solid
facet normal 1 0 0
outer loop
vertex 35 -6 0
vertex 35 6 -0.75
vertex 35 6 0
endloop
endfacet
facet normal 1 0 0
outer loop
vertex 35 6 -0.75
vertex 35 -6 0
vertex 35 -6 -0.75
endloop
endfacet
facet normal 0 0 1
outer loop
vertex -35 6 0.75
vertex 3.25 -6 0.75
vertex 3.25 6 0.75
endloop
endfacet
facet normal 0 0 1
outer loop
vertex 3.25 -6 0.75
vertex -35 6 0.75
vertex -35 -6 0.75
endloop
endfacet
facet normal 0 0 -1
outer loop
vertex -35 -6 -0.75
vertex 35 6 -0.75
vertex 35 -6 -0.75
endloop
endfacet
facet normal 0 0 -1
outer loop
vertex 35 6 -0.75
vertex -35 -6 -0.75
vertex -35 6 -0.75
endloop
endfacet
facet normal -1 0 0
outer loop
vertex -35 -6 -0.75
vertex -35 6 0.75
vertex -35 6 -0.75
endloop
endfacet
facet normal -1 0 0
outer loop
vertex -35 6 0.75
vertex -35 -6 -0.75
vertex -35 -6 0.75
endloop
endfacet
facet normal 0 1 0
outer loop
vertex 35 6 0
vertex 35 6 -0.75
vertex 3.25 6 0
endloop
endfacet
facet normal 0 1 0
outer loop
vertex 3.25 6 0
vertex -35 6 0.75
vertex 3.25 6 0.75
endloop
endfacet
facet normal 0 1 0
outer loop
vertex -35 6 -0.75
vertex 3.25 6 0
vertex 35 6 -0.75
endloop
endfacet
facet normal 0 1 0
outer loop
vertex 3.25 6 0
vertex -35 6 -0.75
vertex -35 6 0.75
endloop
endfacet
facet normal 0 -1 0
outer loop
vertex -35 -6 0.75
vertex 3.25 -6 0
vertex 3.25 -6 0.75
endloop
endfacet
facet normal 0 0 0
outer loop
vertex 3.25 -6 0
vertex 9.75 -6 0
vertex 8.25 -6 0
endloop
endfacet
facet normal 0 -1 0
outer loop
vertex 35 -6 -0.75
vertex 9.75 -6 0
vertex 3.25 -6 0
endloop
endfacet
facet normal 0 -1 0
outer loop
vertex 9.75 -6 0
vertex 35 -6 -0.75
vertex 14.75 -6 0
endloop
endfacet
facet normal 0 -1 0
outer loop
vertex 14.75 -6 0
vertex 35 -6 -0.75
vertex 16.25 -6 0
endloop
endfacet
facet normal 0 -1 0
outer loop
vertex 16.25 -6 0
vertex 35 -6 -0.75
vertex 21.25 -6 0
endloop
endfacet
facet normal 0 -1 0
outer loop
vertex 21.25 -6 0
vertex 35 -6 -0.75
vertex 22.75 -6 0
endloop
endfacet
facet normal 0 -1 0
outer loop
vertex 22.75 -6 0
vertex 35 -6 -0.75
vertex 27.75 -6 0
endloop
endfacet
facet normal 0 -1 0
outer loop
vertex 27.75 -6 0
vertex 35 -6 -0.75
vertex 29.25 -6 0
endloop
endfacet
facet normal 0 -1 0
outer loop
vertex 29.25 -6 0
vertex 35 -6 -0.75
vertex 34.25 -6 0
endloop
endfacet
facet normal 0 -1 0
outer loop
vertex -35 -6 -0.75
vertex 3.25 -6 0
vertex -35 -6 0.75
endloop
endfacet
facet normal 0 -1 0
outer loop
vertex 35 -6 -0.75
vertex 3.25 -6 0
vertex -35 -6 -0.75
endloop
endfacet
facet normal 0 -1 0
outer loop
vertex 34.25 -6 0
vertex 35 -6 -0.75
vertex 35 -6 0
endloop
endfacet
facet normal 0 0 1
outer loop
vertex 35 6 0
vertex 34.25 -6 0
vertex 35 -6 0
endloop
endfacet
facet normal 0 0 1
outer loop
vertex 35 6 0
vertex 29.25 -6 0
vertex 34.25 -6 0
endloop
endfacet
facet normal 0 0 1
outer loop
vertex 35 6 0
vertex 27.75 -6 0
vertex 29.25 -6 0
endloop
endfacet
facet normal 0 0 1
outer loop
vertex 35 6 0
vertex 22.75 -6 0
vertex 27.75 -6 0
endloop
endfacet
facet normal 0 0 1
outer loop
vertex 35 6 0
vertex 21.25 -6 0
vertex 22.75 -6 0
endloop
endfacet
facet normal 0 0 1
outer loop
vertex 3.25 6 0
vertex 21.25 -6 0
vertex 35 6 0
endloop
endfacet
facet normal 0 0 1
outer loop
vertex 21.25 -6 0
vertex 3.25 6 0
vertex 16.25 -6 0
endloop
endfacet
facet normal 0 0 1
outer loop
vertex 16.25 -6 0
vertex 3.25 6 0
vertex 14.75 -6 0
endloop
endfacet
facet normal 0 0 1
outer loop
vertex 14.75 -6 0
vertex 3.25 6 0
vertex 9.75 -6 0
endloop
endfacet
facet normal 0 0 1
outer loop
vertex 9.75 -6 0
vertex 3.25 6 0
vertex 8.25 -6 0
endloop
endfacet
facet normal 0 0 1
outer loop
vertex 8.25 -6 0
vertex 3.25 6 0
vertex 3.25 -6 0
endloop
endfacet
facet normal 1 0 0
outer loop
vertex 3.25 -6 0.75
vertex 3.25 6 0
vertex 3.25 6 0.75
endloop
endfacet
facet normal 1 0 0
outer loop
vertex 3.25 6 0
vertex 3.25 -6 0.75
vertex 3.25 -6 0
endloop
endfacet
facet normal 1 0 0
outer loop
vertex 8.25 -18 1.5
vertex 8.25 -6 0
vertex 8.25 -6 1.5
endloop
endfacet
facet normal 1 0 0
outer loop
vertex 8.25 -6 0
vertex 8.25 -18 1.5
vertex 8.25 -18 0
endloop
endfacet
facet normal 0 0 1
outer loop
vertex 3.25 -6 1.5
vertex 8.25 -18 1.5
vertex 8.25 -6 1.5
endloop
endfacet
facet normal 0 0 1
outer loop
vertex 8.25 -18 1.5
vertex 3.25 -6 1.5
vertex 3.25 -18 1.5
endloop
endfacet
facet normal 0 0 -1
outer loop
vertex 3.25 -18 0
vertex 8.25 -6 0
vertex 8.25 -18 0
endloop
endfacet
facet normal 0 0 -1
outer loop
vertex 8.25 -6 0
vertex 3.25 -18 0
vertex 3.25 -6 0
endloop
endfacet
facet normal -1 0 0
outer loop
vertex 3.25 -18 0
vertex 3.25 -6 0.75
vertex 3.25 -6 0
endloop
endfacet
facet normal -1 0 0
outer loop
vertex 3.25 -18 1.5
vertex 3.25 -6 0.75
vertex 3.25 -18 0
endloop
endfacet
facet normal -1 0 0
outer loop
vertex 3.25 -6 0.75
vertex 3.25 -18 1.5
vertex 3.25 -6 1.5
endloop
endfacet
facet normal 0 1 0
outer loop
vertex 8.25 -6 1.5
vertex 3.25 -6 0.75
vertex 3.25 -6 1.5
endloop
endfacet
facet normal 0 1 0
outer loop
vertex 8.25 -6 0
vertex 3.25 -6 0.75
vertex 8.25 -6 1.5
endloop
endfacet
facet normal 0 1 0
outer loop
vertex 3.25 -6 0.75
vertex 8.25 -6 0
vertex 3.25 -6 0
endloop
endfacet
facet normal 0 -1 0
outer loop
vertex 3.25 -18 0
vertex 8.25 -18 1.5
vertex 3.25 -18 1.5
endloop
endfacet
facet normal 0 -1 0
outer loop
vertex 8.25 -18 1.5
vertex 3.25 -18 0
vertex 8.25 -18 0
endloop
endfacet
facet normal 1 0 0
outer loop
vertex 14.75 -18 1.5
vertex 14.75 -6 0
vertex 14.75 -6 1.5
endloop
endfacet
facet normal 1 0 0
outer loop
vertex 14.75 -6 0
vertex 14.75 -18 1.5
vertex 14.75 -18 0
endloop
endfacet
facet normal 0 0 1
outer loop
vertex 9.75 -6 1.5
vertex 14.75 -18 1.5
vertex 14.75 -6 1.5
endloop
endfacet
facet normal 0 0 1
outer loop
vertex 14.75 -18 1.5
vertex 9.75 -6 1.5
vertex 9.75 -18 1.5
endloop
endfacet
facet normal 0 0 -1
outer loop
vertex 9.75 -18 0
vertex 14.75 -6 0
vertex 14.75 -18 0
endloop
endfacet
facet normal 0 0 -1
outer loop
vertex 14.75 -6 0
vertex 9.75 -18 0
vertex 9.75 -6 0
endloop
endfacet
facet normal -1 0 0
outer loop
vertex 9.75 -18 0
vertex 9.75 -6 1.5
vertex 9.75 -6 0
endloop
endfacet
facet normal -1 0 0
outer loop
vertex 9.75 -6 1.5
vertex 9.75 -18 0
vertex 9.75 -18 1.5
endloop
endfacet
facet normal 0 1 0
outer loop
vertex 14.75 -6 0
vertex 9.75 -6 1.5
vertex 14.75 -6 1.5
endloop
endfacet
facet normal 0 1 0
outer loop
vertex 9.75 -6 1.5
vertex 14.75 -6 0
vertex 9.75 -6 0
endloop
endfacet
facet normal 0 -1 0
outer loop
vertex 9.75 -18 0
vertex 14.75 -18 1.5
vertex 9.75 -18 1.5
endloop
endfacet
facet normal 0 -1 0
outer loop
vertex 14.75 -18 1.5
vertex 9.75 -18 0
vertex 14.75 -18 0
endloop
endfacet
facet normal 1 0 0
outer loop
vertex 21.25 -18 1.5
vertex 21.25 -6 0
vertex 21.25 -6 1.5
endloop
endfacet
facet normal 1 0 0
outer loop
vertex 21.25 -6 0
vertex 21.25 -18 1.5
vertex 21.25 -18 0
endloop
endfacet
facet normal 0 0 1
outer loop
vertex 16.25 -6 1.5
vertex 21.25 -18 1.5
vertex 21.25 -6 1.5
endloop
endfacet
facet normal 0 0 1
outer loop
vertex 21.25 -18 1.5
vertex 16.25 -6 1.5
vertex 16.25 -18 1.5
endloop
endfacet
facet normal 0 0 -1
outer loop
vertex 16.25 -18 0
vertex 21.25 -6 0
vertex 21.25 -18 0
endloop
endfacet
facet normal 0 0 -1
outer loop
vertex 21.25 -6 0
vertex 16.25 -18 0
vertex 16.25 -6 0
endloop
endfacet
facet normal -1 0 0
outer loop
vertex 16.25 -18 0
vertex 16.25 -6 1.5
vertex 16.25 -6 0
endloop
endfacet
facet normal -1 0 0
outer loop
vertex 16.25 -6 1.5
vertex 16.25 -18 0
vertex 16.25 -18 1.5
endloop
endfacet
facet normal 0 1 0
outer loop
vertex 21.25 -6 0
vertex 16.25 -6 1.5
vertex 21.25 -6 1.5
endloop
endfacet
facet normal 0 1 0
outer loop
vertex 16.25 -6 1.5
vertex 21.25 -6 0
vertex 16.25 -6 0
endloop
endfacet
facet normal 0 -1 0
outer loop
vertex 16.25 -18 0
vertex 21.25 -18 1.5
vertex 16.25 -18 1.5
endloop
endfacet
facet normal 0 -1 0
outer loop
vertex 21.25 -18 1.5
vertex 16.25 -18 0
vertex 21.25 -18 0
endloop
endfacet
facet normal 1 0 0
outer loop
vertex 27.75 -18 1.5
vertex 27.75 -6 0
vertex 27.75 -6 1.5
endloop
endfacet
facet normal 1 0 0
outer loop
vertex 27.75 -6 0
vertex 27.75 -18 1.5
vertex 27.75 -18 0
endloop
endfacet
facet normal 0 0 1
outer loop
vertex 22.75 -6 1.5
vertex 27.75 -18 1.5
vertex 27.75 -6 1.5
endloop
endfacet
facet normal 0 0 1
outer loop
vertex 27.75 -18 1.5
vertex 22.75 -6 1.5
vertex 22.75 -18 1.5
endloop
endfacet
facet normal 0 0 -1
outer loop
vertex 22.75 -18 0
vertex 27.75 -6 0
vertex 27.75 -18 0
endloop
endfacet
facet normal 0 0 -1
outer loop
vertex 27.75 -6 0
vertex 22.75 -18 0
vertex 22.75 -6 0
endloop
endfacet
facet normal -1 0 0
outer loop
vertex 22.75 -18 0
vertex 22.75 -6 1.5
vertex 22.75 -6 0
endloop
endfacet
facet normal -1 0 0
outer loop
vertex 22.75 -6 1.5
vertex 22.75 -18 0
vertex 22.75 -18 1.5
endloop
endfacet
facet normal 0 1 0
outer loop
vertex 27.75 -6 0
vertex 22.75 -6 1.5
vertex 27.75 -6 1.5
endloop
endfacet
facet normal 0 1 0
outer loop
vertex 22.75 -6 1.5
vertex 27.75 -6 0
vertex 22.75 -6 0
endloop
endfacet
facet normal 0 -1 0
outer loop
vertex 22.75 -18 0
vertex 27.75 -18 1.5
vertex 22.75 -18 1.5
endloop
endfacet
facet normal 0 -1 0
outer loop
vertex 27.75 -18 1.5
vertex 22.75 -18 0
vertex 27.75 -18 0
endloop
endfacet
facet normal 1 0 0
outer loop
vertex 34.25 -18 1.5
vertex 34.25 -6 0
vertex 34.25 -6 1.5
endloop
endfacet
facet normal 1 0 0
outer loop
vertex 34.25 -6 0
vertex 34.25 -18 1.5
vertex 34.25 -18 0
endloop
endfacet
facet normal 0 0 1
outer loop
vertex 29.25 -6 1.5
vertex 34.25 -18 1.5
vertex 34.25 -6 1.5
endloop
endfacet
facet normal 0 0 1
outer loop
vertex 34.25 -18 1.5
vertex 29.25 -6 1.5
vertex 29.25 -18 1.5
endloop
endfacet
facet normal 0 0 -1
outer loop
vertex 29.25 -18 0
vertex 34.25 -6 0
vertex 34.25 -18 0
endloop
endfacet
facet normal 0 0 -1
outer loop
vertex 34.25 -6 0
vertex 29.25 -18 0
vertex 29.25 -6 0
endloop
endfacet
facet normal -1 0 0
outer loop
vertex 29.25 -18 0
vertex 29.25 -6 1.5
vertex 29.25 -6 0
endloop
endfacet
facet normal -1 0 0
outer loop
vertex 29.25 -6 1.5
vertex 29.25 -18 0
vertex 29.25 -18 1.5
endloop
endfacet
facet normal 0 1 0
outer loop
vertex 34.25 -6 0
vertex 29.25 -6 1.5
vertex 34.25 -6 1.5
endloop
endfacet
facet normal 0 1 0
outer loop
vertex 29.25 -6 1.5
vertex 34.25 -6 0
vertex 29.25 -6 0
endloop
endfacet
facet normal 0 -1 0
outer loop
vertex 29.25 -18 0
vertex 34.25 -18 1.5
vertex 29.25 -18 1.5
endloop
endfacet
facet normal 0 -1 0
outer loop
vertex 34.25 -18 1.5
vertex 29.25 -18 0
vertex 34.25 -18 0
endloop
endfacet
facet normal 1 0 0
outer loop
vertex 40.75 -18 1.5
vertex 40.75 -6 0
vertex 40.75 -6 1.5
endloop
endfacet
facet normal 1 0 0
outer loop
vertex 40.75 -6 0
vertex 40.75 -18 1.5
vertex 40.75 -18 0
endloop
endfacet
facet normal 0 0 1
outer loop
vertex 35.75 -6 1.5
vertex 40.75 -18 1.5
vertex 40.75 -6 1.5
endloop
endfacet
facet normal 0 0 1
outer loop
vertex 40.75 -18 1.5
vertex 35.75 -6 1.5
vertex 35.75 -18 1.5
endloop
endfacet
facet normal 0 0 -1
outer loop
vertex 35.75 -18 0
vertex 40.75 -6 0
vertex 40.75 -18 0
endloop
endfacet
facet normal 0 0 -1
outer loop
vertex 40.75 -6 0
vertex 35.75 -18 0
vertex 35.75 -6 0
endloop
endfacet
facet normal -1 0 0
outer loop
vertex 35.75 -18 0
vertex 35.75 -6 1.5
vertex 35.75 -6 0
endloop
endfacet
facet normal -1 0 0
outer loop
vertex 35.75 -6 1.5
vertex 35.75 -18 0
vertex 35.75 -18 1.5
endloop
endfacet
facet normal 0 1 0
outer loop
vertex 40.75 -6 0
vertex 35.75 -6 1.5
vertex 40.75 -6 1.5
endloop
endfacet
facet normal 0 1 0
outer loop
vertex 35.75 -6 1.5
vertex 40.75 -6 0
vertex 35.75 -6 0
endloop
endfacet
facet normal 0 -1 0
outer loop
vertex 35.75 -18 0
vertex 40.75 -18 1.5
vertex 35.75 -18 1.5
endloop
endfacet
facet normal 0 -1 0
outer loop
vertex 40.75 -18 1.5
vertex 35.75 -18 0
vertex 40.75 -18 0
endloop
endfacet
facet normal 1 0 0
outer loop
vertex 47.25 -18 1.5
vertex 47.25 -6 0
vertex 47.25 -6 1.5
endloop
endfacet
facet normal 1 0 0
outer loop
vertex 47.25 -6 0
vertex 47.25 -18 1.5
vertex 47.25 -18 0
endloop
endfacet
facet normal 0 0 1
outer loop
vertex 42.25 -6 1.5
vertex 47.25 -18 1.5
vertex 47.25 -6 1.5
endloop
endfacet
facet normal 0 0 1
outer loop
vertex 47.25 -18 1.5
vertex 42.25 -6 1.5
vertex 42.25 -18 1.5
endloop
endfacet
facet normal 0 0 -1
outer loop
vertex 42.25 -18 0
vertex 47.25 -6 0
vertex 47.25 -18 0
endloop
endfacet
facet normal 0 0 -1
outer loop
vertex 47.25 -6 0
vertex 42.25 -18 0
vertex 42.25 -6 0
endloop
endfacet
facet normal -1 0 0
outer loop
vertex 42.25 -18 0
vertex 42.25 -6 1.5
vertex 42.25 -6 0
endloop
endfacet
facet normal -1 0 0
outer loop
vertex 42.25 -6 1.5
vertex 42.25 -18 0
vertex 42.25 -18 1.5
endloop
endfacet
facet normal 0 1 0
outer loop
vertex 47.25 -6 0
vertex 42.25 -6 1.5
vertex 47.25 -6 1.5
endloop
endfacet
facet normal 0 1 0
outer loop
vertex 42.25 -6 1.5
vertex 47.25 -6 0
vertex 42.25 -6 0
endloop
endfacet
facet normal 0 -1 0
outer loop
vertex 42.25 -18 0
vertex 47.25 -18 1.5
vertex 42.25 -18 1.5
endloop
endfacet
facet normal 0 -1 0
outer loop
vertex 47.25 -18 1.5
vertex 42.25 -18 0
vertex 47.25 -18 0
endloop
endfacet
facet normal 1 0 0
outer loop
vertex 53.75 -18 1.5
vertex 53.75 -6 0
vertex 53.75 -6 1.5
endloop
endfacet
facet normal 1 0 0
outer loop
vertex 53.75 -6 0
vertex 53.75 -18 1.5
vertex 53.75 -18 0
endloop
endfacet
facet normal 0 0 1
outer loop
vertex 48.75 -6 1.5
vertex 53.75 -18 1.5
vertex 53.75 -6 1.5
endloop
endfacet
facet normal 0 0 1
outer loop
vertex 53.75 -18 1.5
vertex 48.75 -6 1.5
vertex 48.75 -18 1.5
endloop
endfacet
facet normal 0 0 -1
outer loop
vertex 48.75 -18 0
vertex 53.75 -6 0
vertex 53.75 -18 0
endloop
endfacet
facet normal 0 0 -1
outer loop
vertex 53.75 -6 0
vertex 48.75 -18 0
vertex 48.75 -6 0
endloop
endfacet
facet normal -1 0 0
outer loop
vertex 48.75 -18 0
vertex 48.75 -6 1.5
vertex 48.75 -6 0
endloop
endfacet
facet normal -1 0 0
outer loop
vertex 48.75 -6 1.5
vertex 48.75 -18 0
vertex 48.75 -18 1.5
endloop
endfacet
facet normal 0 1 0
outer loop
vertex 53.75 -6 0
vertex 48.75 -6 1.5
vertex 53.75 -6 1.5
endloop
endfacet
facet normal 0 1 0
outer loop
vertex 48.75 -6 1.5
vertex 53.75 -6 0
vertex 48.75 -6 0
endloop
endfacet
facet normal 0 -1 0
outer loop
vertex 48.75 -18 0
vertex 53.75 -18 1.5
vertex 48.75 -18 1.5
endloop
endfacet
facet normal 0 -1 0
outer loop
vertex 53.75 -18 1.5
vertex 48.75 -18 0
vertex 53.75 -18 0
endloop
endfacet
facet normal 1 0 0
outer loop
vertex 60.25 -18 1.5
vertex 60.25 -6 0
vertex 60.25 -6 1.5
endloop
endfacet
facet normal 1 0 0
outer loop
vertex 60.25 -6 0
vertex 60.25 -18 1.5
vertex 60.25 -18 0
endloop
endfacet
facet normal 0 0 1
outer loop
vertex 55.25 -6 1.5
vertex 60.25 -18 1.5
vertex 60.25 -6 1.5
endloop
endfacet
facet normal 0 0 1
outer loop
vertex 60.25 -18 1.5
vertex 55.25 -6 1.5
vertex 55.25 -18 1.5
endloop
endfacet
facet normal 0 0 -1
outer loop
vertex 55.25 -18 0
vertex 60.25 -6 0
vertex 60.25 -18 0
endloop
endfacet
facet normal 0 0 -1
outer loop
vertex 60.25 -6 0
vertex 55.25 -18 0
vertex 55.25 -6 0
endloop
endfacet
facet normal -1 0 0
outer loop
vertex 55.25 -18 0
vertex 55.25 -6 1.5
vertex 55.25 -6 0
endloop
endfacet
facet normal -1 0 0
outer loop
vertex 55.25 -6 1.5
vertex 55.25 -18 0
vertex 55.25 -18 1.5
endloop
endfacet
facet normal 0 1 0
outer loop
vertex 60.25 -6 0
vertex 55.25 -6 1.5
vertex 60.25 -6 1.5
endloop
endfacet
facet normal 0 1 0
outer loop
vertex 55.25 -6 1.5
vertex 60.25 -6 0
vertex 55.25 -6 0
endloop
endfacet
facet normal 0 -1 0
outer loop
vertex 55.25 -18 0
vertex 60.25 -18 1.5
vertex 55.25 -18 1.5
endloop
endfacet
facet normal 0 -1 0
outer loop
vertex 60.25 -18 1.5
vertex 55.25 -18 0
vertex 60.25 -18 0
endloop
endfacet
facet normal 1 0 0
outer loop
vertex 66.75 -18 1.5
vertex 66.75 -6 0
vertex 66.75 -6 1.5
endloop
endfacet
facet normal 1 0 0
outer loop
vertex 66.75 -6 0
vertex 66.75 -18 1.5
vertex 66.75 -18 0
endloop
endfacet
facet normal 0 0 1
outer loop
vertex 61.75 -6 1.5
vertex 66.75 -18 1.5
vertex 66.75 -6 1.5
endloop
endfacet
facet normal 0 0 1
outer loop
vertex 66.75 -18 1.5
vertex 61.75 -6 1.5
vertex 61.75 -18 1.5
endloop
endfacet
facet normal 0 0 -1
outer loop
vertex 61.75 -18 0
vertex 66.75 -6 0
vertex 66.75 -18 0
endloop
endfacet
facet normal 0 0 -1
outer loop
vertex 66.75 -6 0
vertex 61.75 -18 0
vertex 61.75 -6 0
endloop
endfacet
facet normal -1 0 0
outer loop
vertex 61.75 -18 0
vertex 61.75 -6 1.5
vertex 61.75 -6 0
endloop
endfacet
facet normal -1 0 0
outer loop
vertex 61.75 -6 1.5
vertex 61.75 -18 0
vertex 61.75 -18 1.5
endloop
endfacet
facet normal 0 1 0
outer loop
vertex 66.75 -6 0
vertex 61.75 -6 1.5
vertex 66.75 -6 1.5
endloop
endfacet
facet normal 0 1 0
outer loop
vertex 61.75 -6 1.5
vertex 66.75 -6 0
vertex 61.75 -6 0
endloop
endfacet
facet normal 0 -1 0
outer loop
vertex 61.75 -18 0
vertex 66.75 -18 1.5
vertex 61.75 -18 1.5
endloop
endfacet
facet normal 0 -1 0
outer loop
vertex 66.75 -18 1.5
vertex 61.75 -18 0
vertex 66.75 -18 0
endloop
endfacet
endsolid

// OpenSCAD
// 10-well Agarose Gel Casting Comb
// Designed for FDM printing, lying flat on the XY plane (Z=0).

// --- Dimensions ---
$fn = 64; // Smoothness for curved features

// Spine dimensions
SPINE_LENGTH = 70;   // mm (X)
SPINE_WIDTH = 12;    // mm (Y)
PLATE_THICKNESS = 1.5; // mm (Z)

// Tooth dimensions
NUM_TEETH = 10;
TOOTH_WIDTH = 5.0;   // mm (X)
TOOTH_LENGTH = 12;   // mm (Y) (extends from spine edge)
GAP_SIZE = 1.5;      // mm (X) between teeth

// --- Calculations ---
// Total width of the tooth row
TOOTH_ROW_WIDTH = (NUM_TEETH * TOOTH_WIDTH) + ((NUM_TEETH - 1) * GAP_SIZE);

// Offset to center the tooth row on the spine in X
X_OFFSET = (SPINE_LENGTH - TOOTH_ROW_WIDTH) / 2;

// Position of the spine edge where teeth hang (in Y)
// Spine is centered at Y=0, so it goes from -SPINE_WIDTH/2 to +SPINE_WIDTH/2.
// Teeth hang in -Y direction from the bottom edge (-SPINE_WIDTH/2).
SPINE_Y_HALF = SPINE_WIDTH / 2;
SPINE_Y_START = -SPINE_Y_HALF; // Bottom of spine
TEETH_Y_START = SPINE_Y_START - TOOTH_LENGTH; // Bottom of teeth

// --- Main Body (Spine) ---
// A flat plate 70x12x1.5, centered at origin
difference() {
    // Outer block (centered)
    cube([SPINE_LENGTH, SPINE_WIDTH, PLATE_THICKNESS], center = true);
    
    // Cut out the area where teeth will hang to ensure clean separation
    // We cut a rectangle slightly larger than the tooth row to avoid coplanar faces
    // Start at the bottom of the spine (Y = -6)
    translate([X_OFFSET, SPINE_Y_START, 0]) {
        cube([TOOTH_ROW_WIDTH, TOOTH_LENGTH + 0.1, PLATE_THICKNESS + 0.1], center = false);
    }
}

// --- Teeth ---
// We iterate through each tooth position
for (i = [0 : NUM_TEETH - 1]) {
    // Calculate X position for this tooth
    // Start at X_OFFSET, add tooth width and gaps
    current_x = X_OFFSET + (i * (TOOTH_WIDTH + GAP_SIZE));
    
    // Translate to position
    translate([current_x, TEETH_Y_START, 0]) {
        // Tooth geometry: 5.0 wide (X) x 12 long (Y) x 1.5 thick (Z)
        // The tooth hangs down from the spine edge.
        // With TEETH_Y_START = -18, and cube growing positive Y, it occupies Y from -18 to -6.
        cube([TOOTH_WIDTH, TOOTH_LENGTH, PLATE_THICKNESS], center = false);
    }
}
